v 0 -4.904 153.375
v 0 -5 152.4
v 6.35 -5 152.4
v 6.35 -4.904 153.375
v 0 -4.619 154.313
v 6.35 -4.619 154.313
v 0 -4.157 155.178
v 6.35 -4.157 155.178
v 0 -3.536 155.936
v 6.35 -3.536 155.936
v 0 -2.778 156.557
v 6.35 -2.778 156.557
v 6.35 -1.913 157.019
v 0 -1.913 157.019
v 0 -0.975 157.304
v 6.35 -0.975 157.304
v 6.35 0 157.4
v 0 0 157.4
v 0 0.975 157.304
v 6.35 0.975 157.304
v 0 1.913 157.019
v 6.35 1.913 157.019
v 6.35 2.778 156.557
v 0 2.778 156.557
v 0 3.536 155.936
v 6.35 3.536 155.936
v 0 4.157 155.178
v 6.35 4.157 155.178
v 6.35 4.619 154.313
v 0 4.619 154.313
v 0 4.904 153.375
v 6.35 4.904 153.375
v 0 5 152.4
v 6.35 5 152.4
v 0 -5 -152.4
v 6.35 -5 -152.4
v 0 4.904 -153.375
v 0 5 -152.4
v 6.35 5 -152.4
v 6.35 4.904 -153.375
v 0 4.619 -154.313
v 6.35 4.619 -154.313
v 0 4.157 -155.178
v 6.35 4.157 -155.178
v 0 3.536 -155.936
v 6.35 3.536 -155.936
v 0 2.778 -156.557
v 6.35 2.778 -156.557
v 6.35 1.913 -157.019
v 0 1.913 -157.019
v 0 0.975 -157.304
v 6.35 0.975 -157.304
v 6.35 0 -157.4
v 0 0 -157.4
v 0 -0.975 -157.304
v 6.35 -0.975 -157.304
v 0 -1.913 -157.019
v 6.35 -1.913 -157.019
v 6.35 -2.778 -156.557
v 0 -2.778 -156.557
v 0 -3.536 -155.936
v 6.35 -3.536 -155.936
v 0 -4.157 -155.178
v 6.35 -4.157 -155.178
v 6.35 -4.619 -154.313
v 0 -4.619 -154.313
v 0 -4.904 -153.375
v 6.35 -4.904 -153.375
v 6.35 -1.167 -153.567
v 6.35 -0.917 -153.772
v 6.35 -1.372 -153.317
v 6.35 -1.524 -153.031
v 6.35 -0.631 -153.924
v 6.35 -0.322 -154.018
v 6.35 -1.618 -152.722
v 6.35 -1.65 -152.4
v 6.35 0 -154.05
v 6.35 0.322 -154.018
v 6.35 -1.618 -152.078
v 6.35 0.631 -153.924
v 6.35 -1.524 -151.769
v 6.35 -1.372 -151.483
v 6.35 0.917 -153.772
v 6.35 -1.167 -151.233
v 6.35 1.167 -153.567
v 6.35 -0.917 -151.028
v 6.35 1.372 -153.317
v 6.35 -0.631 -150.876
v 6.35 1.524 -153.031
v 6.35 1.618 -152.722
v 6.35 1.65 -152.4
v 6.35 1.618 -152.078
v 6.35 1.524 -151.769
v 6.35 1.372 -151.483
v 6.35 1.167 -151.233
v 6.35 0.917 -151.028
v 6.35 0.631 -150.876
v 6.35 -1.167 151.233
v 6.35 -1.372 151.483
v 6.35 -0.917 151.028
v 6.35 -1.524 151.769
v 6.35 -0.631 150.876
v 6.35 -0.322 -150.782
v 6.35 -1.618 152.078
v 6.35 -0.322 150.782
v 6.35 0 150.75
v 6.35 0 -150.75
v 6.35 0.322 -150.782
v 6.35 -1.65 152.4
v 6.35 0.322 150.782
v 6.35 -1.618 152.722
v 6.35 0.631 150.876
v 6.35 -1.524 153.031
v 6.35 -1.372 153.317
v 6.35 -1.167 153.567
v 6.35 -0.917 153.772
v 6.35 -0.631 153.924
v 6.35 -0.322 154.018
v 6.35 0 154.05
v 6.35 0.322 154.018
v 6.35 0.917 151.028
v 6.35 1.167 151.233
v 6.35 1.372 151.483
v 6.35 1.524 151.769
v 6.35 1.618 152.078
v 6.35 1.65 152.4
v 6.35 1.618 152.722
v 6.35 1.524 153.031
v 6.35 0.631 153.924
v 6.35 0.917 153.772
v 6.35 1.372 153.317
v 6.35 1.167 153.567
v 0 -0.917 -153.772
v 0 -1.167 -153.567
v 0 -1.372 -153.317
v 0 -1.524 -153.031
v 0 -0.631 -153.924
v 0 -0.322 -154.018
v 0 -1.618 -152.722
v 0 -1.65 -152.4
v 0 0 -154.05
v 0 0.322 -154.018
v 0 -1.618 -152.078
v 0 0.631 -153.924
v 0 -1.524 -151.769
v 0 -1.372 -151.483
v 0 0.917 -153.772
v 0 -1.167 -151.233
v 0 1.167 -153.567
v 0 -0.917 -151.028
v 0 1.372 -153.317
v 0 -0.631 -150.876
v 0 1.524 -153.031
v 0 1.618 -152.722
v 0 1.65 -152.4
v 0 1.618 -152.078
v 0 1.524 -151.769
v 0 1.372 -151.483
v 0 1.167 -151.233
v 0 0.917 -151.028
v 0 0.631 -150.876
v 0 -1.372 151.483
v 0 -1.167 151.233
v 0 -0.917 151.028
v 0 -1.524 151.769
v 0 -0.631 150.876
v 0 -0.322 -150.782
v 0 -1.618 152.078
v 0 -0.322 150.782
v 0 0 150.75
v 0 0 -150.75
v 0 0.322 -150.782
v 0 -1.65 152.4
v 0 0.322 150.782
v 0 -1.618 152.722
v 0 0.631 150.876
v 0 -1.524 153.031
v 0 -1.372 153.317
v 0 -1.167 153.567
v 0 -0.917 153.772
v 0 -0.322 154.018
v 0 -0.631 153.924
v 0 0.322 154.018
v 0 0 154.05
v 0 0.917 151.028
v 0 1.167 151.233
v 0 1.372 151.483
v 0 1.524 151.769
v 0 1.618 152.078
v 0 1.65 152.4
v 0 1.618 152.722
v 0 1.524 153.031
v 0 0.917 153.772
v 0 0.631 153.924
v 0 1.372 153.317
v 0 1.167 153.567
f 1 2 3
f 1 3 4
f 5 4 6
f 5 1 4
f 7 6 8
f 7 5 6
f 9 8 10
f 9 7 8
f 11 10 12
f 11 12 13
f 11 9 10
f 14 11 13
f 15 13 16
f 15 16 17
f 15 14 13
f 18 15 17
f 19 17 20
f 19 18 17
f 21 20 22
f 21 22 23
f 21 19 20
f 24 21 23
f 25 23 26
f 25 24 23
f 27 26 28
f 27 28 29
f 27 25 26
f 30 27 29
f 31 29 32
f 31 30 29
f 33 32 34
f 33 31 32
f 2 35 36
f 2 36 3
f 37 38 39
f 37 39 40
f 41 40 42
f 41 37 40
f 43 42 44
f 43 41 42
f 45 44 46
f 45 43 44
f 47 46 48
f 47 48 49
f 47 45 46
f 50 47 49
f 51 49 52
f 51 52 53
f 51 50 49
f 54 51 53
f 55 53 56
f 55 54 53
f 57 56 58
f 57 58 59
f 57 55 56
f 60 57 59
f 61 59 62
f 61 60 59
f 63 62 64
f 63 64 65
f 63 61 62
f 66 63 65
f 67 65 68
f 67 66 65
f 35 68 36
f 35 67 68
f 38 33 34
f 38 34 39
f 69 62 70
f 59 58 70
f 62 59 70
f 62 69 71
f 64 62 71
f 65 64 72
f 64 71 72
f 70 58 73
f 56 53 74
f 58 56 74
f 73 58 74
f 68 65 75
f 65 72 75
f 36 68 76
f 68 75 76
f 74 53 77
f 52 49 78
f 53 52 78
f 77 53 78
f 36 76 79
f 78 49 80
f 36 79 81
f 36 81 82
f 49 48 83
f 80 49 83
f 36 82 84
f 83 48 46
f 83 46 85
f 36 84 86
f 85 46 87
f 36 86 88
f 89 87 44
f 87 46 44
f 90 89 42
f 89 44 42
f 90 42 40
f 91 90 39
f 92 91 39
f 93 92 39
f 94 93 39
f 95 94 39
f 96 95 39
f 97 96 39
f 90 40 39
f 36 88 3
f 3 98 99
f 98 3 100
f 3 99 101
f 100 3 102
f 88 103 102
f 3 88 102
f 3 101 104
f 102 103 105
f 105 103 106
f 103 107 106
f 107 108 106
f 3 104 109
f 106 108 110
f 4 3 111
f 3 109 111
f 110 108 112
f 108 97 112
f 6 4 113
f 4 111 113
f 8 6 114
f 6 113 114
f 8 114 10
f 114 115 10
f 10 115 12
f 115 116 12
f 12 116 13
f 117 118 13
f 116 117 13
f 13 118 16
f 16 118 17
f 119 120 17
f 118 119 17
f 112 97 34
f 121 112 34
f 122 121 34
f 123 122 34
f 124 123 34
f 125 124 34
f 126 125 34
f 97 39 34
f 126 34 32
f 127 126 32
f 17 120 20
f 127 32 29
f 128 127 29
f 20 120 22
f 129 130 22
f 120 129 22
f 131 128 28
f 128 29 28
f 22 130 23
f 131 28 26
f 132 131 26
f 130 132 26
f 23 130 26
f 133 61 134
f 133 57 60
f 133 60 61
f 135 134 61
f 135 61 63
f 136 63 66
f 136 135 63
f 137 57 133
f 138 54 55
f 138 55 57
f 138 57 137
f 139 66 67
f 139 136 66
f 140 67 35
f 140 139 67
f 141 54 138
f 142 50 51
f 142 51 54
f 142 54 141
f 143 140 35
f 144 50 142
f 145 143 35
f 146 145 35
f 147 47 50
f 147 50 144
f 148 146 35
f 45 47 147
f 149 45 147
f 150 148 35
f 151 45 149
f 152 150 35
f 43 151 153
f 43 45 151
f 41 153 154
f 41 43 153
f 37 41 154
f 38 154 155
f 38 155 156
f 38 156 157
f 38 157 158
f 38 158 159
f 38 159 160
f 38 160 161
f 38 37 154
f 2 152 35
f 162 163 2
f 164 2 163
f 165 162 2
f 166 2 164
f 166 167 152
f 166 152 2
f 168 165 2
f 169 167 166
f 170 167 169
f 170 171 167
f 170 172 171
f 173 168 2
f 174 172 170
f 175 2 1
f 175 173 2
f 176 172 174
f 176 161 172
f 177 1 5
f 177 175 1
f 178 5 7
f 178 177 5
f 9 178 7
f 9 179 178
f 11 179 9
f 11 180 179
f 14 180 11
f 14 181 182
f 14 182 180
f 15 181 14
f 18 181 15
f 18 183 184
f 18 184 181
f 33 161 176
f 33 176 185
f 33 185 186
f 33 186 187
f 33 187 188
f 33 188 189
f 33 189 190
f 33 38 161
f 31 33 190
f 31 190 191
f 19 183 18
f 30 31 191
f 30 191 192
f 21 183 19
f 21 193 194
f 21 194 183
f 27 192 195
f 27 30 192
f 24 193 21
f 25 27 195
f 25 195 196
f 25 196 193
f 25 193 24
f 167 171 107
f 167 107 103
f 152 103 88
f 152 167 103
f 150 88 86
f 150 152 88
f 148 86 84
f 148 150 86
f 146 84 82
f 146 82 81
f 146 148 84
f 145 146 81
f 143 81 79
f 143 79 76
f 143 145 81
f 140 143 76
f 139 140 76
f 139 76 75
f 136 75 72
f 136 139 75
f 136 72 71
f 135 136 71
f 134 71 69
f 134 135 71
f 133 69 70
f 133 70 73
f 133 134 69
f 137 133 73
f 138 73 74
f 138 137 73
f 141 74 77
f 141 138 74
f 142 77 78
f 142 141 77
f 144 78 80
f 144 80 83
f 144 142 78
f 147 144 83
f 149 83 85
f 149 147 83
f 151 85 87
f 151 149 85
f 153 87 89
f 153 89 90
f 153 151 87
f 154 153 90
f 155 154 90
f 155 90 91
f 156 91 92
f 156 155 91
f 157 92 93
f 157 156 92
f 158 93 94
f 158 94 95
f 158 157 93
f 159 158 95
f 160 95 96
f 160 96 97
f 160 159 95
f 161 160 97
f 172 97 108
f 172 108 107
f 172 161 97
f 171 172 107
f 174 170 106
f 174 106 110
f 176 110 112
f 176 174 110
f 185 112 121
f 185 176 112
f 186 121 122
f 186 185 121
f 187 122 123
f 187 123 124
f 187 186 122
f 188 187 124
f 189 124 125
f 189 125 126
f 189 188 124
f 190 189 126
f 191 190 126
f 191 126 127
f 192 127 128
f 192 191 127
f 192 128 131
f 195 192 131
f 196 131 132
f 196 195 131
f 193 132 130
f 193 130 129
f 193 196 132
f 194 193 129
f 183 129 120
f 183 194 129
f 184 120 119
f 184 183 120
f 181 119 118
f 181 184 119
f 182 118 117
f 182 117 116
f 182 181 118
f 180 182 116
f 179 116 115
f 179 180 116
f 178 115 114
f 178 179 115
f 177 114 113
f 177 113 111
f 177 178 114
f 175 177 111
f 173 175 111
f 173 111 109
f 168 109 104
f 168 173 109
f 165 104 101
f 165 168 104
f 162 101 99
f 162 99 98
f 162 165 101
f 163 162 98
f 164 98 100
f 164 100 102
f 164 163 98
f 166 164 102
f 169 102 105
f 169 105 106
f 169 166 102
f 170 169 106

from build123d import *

# Parameters (mm, degrees)
SKETCH1_R           = 1.65
BOSS_EXTRUDE1_DEPTH = 6.35


with BuildPart() as part:
    # Sketch1 → Boss-Extrude1 (new body)
    with BuildSketch(Plane(origin=(0, 0, 0), x_dir=(0, 0, -1), z_dir=(1, 0, 0))):
        with BuildLine():
            Line((-152.4, 5), (152.4, 5))
            ThreePointArc((152.4, 5), (157.4, 0), (152.4, -5))
            Line((152.4, -5), (-152.4, -5))
            ThreePointArc((-152.4, -5), (-157.4, 0), (-152.4, 5))
        make_face()
        with Locations((-152.4, 0)):
            Circle(SKETCH1_R, mode=Mode.SUBTRACT)
        with Locations(Location((152.4, 0, 0), (0, 0, 180))):
            Circle(SKETCH1_R, mode=Mode.SUBTRACT)
    extrude(amount=BOSS_EXTRUDE1_DEPTH)


solid = part.part
